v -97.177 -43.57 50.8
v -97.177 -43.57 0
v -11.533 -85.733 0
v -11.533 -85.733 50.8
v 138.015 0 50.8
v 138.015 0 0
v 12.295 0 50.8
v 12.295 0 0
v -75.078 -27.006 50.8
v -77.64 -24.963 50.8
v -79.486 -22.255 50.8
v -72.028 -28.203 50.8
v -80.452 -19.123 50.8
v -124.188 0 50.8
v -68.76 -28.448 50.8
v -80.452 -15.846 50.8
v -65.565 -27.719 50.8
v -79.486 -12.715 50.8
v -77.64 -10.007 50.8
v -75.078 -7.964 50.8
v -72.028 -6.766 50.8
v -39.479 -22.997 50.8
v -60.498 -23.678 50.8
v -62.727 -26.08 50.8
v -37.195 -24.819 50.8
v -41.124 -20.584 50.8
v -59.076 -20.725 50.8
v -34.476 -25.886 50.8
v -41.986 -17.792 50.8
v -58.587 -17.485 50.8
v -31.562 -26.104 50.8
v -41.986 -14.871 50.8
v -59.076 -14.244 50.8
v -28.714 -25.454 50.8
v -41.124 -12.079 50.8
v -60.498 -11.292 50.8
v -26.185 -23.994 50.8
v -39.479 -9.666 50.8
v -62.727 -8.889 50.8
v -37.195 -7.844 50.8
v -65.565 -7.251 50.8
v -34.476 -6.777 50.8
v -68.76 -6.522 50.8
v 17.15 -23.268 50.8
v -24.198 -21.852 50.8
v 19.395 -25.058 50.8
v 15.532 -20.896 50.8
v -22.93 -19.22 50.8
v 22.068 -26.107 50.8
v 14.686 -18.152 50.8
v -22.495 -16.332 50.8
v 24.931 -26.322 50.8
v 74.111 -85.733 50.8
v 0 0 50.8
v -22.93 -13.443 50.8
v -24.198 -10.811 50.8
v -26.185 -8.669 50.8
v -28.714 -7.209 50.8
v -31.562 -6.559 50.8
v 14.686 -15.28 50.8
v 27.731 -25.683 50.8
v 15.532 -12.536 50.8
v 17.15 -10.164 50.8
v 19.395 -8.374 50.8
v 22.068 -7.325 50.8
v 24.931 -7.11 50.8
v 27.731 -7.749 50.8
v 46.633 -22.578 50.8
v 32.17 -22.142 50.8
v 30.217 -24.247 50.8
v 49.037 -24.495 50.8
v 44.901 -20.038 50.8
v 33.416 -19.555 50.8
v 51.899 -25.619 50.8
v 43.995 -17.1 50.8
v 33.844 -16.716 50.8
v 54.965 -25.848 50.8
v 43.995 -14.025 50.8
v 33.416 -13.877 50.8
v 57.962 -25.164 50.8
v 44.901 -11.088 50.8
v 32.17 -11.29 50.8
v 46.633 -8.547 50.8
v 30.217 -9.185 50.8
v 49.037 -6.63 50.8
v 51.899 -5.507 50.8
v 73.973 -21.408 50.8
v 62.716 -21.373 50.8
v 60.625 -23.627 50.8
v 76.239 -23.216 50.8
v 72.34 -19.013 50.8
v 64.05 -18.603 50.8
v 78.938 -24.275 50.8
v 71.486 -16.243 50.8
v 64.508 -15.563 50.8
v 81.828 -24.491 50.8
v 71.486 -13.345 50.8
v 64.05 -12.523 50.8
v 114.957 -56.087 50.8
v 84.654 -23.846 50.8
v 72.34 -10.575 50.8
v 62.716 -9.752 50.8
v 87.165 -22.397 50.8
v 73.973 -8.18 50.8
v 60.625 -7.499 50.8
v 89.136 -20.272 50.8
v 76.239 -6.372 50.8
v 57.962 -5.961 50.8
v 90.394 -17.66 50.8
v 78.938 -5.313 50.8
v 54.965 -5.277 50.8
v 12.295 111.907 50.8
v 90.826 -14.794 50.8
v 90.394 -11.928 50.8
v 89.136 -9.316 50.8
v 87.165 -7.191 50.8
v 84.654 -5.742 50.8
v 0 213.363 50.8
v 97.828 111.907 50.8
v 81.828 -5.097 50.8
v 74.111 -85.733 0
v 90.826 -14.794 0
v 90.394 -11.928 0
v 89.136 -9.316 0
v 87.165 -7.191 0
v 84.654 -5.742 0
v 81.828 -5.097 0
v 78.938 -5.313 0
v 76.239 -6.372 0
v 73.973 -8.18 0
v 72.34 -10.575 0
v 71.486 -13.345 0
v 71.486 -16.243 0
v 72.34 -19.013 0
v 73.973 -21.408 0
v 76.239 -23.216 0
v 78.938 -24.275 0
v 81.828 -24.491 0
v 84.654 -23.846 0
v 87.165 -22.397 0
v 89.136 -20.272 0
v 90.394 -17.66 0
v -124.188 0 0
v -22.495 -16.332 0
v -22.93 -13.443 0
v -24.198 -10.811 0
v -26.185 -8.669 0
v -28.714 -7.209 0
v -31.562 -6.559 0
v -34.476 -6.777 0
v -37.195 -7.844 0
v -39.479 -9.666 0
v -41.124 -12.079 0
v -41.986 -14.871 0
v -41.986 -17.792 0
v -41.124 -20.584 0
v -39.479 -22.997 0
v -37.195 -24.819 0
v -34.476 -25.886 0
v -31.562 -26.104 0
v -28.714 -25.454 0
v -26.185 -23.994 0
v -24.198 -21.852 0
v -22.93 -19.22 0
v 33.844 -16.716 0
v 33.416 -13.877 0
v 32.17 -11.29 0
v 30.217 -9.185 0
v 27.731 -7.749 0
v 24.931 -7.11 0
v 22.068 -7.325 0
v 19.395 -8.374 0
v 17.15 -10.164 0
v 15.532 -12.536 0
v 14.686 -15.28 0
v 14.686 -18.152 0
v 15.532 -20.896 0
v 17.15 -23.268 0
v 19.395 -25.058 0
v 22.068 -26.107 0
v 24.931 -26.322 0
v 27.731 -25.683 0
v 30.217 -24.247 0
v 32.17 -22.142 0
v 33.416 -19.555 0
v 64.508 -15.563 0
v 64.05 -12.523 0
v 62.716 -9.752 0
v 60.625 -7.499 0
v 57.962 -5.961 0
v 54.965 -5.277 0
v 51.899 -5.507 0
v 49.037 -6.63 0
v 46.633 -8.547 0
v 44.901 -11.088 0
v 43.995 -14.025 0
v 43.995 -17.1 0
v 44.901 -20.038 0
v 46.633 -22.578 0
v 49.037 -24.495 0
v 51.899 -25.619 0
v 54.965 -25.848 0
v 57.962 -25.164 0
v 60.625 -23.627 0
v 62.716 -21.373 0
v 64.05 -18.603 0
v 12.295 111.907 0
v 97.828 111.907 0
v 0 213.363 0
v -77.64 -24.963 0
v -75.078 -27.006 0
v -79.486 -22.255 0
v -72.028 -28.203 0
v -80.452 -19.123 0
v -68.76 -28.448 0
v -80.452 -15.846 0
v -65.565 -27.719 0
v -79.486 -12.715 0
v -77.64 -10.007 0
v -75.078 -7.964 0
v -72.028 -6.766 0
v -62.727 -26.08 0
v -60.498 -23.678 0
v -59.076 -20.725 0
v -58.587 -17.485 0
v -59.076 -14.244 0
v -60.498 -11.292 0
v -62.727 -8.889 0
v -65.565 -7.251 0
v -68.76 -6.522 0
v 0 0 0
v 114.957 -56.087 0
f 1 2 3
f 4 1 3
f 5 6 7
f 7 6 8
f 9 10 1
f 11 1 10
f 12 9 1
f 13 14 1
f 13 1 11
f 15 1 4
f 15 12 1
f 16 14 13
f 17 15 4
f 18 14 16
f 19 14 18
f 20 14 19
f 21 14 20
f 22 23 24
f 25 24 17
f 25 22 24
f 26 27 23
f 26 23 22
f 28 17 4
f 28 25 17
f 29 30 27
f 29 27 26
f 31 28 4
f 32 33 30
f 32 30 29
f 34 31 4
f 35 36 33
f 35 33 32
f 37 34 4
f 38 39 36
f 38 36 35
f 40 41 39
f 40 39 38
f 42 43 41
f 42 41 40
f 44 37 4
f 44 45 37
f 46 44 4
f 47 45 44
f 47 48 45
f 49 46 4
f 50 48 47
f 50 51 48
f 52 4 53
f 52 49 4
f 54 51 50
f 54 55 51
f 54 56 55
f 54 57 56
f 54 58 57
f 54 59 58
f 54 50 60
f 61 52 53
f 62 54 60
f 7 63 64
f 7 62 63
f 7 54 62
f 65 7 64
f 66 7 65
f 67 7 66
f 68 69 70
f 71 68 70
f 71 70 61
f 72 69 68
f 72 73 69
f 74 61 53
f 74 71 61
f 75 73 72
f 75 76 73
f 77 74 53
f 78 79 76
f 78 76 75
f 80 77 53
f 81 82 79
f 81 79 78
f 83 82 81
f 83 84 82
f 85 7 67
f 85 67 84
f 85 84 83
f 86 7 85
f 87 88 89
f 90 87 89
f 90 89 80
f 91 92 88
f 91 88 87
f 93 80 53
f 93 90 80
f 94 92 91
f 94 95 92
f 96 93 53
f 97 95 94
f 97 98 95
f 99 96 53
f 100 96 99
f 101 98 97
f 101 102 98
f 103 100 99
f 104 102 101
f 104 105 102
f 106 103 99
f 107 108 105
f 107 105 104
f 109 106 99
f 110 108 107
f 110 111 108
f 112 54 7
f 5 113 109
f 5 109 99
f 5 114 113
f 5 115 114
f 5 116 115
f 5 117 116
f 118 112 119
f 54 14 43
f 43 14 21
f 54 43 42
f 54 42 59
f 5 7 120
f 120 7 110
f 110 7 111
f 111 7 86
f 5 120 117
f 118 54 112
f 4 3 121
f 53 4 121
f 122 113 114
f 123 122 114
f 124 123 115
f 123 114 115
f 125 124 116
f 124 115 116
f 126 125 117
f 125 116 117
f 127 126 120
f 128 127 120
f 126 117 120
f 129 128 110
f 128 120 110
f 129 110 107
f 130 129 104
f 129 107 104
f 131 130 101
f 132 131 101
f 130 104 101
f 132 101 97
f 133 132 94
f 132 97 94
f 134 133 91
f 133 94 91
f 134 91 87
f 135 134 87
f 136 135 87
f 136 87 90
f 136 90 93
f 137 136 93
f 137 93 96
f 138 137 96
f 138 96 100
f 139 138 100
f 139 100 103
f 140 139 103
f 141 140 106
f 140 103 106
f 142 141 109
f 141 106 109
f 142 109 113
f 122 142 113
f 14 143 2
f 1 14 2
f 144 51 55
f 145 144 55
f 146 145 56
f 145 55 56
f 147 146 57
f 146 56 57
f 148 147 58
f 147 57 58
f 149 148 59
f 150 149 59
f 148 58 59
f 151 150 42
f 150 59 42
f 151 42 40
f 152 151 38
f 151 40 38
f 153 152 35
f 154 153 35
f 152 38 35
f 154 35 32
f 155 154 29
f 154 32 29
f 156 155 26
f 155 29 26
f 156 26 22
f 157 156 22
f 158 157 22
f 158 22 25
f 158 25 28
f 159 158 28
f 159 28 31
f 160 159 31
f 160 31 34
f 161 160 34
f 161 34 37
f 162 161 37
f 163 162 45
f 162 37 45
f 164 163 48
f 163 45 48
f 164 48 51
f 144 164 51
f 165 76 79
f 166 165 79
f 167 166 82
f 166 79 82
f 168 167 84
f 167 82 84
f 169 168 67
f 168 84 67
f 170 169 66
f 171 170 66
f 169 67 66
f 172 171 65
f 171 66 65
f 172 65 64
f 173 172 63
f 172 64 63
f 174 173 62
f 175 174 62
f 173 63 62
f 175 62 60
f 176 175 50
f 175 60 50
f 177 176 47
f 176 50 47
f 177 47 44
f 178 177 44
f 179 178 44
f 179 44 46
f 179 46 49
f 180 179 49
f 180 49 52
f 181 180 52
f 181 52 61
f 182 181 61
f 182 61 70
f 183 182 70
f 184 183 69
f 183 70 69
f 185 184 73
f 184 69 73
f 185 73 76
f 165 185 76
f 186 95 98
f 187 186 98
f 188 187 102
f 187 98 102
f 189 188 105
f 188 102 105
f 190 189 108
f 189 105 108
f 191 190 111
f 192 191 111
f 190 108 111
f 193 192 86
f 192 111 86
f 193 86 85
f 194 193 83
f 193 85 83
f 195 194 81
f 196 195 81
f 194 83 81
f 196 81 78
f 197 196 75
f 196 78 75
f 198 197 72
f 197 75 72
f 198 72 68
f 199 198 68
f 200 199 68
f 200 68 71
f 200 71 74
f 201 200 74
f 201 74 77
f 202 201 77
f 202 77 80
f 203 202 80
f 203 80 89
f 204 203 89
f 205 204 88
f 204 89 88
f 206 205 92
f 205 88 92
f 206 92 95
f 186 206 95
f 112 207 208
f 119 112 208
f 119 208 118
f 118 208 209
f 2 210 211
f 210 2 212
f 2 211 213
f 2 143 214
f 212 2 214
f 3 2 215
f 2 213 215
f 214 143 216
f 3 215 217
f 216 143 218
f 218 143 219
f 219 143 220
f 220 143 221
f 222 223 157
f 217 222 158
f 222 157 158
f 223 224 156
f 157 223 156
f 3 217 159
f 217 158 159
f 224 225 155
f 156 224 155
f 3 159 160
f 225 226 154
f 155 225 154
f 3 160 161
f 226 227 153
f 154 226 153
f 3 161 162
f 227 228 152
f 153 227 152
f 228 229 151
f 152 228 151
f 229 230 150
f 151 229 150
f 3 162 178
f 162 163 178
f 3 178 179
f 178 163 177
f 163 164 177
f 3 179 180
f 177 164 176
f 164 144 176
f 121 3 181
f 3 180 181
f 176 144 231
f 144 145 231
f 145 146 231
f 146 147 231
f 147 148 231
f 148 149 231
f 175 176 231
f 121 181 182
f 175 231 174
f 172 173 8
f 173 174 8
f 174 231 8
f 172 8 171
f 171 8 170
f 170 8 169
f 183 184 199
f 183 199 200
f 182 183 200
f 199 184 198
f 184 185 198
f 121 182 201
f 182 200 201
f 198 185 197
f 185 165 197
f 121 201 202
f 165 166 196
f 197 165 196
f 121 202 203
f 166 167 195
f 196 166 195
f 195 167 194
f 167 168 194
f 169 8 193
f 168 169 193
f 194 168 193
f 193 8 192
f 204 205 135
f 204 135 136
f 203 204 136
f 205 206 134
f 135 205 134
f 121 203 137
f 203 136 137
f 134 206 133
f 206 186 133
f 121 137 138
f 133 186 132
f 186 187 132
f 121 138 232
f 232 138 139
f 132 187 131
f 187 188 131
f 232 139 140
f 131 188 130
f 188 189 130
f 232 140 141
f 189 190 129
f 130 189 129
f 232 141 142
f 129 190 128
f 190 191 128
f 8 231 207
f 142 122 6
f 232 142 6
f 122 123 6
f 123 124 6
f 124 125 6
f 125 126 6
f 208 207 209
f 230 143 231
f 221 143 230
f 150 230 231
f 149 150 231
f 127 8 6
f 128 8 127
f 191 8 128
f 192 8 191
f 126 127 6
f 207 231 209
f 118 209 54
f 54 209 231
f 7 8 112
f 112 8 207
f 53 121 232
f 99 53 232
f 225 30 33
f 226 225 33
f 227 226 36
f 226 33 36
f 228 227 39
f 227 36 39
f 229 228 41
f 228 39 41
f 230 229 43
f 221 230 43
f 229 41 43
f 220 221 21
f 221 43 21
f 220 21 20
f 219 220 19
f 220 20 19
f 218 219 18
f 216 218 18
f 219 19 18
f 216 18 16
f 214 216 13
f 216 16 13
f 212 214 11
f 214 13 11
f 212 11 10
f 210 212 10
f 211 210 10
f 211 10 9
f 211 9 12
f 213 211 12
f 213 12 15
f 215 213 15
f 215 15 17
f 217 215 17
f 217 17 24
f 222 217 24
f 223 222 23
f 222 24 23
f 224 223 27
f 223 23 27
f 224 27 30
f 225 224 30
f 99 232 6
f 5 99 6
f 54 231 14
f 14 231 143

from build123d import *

# Parameters (mm, degrees)
F0_W     = 12.2949928045
F0_H     = 111.9073554873
F1_DEPTH = 25.4
F2_DEPTH = 50.8
F3_R     = 9.6329205763
F3_R_2   = 10.3143996585
F3_R_3   = 9.7245159321
F3_R_4   = 10.9939674149
F3_R_5   = 9.8001864777
F4_DEPTH = 50.8


with BuildPart() as f1:
    # F0 (on Top) → F1 (new body)
    with BuildSketch(Plane.XY):
        with Locations((6.1474964023, 55.9536777437)):
            Rectangle(F0_W, F0_H)
        Polygon((12.2949928045, 0), (0, 0), (-124.18808043, 0), (-97.1772074699, -43.5698479414), (-11.5329865366, -85.7331603765), (74.1112306714, -85.7331603765), (114.9569302797, -56.087076664), (138.0150020123, 0), align=None)
        Polygon((0, 213.3628129959), (0, 111.9073554873), (12.2949928045, 111.9073554873), (97.8280827403, 111.9073554873), align=None)
    extrude(amount=F1_DEPTH)

    # F0 (on Top) → F2 (join)
    with BuildSketch(Plane.XY):
        with Locations((6.1474964023, 55.9536777437)):
            Rectangle(F0_W, F0_H)
        Polygon((12.2949928045, 0), (0, 0), (-124.18808043, 0), (-97.1772074699, -43.5698479414), (-11.5329865366, -85.7331603765), (74.1112306714, -85.7331603765), (114.9569302797, -56.087076664), (138.0150020123, 0), align=None)
        Polygon((0, 213.3628129959), (0, 111.9073554873), (12.2949928045, 111.9073554873), (97.8280827403, 111.9073554873), align=None)
    extrude(amount=F2_DEPTH)

    # F3 (on face) → F4 (cut)
    with BuildSketch(Plane.XY.offset(50.8)):
        with Locations((24.2112372071, -16.715940088)):
            Circle(F3_R)
        with Locations((54.1940517724, -15.5627541244)):
            Circle(F3_R_2)
        with Locations((81.1017081141, -14.7939696908)):
            Circle(F3_R_3)
        with Locations((-69.5811584592, -17.4847338349)):
            Circle(F3_R_4)
        with Locations((-32.2948358953, -16.3315478712)):
            Circle(F3_R_5)
    extrude(amount=-F4_DEPTH, mode=Mode.SUBTRACT)


solid = f1.part
